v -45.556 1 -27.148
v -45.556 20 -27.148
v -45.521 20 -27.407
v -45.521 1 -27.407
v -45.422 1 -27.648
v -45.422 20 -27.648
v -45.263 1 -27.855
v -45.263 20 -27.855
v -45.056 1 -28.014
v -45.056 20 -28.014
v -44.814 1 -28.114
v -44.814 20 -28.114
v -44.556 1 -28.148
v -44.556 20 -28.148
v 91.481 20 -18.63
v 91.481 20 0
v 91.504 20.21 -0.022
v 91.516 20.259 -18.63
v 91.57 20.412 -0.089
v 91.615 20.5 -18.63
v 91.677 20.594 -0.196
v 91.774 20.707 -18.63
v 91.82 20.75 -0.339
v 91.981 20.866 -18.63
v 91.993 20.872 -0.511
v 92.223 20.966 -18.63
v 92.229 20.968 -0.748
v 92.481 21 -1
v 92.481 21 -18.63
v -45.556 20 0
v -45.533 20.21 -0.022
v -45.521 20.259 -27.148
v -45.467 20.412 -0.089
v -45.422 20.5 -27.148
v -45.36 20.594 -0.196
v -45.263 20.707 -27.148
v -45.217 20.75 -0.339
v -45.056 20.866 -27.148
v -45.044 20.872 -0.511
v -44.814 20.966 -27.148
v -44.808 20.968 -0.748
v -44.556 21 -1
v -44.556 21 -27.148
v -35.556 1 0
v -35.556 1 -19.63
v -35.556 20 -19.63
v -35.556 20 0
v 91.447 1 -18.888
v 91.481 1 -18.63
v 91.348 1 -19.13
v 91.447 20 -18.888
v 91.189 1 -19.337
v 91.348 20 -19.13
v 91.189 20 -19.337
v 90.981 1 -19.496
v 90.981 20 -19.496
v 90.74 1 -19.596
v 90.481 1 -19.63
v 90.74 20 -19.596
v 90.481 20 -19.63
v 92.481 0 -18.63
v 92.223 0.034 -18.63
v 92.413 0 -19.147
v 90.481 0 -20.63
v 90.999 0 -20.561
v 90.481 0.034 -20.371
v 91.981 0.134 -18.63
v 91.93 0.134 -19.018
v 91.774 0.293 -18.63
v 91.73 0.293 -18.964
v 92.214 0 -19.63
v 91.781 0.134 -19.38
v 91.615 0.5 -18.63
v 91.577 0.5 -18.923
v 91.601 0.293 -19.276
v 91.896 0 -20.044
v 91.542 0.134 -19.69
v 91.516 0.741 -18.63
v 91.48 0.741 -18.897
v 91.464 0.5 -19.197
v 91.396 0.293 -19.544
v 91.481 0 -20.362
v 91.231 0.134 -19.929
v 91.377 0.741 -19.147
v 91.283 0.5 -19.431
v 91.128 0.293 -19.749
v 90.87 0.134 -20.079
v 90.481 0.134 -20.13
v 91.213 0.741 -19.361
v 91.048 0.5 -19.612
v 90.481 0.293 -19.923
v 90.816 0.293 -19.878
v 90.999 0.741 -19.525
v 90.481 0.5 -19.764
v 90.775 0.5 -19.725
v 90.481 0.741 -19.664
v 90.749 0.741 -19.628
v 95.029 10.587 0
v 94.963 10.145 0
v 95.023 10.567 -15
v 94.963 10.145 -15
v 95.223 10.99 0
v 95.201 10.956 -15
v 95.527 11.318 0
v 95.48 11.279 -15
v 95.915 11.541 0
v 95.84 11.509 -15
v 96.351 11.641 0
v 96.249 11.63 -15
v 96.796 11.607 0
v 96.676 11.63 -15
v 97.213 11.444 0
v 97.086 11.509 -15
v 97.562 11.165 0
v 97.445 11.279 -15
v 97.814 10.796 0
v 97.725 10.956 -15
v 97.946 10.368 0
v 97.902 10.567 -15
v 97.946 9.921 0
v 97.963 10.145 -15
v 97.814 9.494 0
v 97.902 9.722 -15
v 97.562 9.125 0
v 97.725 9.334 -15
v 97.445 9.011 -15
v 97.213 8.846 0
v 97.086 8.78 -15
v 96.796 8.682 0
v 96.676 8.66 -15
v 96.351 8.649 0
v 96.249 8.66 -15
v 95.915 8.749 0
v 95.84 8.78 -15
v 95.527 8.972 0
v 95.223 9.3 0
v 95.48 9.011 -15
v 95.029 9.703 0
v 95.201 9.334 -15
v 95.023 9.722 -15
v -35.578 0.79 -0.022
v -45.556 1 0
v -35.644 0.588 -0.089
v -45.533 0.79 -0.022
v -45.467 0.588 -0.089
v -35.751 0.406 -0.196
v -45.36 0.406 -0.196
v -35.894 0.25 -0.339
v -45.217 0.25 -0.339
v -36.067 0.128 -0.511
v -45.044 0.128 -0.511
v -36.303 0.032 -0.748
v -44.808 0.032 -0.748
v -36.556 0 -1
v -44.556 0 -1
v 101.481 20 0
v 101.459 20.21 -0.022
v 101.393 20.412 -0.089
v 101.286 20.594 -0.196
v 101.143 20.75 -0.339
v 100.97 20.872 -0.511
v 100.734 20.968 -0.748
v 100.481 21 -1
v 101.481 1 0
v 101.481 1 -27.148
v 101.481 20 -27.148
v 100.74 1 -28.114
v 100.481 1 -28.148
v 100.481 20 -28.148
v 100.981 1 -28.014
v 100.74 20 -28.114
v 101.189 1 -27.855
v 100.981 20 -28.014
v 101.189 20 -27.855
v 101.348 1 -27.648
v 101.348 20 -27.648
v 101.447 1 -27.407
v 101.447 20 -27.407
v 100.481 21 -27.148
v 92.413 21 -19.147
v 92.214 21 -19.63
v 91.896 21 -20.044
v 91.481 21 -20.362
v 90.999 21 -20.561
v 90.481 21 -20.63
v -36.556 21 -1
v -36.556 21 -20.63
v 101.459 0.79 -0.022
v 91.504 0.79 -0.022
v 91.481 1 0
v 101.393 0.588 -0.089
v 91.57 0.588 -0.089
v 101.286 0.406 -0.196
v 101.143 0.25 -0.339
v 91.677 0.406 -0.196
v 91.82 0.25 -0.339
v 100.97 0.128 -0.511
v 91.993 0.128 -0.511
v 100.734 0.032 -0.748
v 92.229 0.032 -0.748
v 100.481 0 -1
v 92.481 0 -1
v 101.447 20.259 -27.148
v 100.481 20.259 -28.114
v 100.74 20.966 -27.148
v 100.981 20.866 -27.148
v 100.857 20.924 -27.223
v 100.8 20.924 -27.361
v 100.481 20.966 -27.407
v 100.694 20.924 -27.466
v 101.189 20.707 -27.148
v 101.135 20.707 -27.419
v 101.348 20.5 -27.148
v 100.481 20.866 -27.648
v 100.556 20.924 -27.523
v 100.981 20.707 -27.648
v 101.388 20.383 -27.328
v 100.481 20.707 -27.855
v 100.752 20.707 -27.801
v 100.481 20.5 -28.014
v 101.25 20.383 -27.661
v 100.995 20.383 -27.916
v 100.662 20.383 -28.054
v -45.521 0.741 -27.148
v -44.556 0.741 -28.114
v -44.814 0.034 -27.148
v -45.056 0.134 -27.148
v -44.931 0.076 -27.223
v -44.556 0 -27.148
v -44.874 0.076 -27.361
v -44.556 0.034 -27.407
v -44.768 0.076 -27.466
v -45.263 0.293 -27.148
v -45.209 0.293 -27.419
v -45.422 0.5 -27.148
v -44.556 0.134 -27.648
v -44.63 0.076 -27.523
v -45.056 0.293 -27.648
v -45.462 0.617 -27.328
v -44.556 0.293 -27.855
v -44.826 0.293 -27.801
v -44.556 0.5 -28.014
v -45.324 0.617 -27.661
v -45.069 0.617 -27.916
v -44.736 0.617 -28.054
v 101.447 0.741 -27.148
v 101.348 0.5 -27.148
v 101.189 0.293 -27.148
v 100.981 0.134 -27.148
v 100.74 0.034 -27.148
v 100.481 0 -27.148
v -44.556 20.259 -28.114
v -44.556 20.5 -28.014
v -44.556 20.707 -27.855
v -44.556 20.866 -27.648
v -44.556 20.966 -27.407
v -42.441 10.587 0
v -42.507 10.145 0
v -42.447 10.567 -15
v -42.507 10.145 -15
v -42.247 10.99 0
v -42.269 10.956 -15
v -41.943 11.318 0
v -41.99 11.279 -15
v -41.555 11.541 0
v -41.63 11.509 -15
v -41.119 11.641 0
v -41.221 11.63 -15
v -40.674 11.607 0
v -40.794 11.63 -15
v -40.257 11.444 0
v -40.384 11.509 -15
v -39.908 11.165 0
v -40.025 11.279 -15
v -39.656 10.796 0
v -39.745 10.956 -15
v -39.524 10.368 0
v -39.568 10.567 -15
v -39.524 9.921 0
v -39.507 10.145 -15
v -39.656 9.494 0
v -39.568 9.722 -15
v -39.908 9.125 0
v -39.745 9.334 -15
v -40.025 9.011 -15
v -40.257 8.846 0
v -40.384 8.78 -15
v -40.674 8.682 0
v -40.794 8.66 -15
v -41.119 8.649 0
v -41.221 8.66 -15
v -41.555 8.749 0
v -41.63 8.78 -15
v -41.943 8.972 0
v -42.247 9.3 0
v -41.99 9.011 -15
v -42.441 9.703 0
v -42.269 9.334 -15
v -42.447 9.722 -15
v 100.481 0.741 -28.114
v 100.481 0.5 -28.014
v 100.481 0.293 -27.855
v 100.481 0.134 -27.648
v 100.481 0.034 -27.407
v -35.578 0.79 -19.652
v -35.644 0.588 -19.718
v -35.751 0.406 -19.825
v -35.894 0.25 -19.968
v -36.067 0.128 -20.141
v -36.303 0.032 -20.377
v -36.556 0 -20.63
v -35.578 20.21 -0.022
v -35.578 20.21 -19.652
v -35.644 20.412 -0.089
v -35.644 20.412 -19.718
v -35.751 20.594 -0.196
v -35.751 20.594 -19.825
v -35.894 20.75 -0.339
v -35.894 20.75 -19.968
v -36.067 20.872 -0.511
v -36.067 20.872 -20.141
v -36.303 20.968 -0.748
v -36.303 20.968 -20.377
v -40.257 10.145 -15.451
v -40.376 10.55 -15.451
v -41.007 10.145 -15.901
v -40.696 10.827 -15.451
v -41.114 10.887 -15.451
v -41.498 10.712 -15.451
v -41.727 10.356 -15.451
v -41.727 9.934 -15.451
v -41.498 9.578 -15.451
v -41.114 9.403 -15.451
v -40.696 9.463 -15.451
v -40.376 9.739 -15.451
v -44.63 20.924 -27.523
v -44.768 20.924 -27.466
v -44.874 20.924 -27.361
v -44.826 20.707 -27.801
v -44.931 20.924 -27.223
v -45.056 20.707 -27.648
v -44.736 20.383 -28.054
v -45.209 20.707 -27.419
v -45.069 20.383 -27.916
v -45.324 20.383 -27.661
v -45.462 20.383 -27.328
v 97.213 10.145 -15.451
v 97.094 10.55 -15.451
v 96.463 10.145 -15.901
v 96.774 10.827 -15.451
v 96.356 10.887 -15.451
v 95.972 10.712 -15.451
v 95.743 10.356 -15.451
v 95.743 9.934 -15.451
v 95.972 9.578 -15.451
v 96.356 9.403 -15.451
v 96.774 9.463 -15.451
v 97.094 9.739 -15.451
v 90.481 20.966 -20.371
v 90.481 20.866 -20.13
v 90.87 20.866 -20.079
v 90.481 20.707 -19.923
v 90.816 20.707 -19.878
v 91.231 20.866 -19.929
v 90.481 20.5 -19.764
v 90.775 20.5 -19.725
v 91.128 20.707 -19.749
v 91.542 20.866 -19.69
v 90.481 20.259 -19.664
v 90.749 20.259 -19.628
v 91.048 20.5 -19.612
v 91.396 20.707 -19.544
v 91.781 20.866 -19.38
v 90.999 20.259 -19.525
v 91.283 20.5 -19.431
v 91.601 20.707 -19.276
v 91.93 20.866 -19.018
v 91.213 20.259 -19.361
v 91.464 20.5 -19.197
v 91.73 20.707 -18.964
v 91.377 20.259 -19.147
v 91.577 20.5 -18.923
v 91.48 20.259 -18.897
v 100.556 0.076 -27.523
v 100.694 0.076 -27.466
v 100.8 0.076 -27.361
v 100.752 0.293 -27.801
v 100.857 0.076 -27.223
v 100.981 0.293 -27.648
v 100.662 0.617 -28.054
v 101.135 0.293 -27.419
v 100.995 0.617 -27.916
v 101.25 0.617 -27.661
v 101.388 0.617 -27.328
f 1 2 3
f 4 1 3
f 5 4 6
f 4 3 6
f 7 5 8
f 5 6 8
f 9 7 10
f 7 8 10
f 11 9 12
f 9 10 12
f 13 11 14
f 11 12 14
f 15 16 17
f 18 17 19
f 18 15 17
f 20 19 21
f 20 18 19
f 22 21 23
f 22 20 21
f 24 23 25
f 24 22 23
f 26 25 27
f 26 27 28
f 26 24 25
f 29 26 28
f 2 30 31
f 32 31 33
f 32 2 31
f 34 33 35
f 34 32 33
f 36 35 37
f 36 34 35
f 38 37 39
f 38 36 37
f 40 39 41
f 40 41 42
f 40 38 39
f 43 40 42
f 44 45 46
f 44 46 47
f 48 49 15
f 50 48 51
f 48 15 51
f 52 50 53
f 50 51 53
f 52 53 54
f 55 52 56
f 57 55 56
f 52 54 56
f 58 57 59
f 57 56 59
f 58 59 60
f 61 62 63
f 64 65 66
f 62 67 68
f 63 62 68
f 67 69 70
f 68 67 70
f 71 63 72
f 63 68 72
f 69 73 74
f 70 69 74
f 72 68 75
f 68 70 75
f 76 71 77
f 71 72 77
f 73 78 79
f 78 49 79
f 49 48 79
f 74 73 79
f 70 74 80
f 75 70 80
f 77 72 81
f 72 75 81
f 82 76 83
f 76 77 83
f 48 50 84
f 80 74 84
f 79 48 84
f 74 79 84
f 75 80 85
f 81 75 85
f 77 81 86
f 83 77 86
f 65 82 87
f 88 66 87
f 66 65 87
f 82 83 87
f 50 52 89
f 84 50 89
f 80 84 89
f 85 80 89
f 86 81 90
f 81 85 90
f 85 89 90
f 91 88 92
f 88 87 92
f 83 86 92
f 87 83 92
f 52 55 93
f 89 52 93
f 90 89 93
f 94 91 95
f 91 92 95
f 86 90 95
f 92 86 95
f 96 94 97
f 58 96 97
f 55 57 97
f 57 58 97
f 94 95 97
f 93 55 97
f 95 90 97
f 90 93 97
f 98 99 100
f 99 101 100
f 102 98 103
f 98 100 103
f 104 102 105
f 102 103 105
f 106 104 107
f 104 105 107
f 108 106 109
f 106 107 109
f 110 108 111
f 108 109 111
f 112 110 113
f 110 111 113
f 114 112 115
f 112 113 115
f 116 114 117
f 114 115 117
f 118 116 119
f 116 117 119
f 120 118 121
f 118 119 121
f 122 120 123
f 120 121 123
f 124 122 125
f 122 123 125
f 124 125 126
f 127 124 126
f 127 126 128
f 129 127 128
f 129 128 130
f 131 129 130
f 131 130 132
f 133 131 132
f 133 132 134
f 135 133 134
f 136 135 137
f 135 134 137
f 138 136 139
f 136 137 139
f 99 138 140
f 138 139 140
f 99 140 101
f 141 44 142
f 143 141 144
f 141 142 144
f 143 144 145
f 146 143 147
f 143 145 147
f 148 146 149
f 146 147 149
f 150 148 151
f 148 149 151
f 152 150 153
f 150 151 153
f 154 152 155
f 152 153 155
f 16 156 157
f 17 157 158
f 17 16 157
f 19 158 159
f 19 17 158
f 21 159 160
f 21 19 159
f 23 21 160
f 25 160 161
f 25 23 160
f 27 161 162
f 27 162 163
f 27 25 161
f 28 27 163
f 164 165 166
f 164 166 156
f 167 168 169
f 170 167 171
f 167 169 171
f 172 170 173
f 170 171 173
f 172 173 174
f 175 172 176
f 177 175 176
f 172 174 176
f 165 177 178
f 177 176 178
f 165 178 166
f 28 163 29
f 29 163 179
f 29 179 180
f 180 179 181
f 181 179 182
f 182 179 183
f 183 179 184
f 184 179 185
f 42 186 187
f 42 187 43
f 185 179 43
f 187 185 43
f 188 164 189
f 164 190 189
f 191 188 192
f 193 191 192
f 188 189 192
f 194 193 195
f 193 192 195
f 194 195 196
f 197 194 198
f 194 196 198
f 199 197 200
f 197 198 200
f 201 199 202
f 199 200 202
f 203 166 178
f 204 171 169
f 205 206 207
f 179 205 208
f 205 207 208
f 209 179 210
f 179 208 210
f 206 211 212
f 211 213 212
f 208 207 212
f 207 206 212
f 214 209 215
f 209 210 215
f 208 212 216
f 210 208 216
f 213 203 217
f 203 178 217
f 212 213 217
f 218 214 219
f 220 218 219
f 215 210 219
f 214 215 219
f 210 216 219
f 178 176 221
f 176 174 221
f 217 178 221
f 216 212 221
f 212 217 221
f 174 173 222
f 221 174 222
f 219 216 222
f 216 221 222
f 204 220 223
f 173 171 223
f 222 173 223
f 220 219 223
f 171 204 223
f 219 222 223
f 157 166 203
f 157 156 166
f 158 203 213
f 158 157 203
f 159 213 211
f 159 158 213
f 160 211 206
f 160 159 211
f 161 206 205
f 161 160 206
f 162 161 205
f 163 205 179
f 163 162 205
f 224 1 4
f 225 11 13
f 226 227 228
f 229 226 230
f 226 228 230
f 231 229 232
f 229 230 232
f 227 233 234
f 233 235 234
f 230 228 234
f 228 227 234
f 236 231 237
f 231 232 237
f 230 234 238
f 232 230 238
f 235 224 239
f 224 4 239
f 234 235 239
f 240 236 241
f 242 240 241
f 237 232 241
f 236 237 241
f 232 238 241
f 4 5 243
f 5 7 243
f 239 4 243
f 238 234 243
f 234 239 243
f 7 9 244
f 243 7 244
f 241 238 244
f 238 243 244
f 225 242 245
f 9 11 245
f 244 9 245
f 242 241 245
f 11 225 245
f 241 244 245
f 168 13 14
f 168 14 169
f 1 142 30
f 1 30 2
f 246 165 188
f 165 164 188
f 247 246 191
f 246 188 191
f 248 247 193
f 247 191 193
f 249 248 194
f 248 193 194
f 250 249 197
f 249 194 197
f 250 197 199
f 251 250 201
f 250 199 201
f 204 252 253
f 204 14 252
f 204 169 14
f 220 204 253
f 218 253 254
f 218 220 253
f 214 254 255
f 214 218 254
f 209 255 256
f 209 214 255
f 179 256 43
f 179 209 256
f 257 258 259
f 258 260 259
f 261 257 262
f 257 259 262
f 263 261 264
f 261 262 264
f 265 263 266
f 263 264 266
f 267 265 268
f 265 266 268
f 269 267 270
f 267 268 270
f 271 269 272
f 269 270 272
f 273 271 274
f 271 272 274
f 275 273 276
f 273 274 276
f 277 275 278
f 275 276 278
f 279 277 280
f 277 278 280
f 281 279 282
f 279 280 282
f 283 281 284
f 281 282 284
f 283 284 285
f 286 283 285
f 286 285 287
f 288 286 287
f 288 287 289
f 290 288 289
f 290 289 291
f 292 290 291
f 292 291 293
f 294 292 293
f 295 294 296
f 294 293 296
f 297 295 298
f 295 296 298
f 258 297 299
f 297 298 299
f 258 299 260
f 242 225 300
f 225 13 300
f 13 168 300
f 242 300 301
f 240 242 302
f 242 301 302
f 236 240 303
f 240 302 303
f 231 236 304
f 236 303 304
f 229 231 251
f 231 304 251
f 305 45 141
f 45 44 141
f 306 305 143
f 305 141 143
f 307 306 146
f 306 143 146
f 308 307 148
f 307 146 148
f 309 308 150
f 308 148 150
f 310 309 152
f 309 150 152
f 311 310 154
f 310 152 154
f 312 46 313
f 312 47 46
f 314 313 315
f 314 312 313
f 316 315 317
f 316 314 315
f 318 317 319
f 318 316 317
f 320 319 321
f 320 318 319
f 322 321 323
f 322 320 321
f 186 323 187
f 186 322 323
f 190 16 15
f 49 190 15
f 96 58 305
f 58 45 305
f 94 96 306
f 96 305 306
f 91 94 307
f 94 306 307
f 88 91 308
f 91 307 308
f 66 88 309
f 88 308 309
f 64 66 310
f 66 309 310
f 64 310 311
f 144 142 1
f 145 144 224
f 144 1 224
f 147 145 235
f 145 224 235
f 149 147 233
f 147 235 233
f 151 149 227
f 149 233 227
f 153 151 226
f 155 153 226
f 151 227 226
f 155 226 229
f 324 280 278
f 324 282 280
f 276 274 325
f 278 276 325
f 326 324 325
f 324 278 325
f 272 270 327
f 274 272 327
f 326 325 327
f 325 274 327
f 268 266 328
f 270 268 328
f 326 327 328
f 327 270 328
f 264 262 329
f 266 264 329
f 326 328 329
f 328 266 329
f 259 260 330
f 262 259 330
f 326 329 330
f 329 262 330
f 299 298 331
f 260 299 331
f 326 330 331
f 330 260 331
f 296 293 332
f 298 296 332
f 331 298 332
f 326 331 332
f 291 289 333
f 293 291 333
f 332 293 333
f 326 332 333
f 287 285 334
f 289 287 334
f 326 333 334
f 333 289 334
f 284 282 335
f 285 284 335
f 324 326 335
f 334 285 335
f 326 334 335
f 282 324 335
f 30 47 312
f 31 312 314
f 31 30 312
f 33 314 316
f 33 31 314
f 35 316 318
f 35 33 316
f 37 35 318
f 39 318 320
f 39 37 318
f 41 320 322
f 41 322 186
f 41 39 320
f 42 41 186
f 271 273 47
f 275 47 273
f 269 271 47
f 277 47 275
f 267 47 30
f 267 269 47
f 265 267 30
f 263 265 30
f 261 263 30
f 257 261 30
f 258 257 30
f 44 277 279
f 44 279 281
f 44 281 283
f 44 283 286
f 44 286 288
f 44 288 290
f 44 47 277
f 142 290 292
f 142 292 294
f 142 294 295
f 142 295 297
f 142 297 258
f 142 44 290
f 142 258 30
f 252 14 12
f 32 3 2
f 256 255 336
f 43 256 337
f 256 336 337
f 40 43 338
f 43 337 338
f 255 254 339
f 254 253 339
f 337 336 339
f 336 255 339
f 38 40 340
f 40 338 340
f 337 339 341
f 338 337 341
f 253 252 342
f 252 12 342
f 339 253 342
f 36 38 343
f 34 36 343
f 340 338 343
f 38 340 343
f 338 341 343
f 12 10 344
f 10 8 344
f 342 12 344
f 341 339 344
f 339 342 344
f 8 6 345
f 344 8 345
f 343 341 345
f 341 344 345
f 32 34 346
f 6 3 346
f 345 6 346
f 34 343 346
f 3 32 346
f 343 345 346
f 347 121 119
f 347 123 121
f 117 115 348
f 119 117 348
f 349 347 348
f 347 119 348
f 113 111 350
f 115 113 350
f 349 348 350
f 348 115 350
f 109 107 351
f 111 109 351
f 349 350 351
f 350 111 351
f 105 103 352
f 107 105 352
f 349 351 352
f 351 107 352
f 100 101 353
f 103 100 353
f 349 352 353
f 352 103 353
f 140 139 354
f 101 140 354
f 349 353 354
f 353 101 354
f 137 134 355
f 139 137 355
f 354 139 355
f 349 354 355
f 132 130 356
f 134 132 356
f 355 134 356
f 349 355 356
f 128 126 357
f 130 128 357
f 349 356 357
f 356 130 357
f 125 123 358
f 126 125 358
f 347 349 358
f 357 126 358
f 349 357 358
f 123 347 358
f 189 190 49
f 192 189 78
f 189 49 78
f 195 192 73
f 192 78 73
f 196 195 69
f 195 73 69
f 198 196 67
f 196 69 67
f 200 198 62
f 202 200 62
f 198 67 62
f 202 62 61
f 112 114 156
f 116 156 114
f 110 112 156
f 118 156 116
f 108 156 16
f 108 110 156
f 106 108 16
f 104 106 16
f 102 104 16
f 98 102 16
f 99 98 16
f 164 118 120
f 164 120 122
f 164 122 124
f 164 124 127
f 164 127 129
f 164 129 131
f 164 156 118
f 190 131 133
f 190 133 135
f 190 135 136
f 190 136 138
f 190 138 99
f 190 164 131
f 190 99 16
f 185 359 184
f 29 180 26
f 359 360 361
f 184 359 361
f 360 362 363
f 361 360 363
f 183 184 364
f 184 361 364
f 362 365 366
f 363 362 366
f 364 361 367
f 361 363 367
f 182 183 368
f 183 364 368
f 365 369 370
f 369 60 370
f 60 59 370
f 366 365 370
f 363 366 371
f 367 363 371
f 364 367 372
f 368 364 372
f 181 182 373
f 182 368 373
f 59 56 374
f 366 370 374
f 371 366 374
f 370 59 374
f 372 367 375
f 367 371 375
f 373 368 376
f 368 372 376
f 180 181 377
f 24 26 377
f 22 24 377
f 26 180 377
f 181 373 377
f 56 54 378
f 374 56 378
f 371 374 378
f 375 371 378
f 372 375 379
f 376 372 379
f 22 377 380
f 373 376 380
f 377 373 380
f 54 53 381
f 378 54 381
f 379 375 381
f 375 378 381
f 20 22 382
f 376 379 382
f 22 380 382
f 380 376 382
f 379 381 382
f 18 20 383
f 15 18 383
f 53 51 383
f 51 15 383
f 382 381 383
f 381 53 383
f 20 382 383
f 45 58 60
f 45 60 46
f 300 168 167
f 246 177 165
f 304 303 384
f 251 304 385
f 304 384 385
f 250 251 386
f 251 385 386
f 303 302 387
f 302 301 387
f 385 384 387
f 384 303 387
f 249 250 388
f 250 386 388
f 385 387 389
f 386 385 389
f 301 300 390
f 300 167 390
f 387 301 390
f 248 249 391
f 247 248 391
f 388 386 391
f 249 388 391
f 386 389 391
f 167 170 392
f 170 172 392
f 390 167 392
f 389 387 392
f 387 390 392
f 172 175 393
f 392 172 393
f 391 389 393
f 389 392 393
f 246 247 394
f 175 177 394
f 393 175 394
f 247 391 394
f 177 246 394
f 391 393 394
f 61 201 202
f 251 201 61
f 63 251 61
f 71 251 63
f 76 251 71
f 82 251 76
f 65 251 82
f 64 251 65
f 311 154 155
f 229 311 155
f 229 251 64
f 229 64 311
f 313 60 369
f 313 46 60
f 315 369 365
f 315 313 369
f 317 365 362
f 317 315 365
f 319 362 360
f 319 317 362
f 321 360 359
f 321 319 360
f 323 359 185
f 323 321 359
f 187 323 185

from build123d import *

# Parameters (mm, degrees)
SALIENTE_EXTRUIR1_DEPTH           = 21
REDONDEO1_R                       = 1
RANURAS_DE_ESPIGA_DE_3_0MM1_D     = 3
RANURAS_DE_ESPIGA_DE_3_0MM1_DEPTH = 15
RANURAS_DE_ESPIGA_DE_3_0MM1_TIP   = 0.901290929


with BuildPart() as part:
    # Croquis1 → Saliente-Extruir1 (new body)
    with BuildSketch(Plane(origin=(0, 0, 0), x_dir=(1, 0, 0), z_dir=(0, 1, 0))):
        Polygon((-45.555555556, 0), (-45.555555556, 28.148148148), (101.481481481, 28.148148148), (101.481481481, 0), (91.481481481, 0), (91.481481481, 19.62962963), (-35.555555556, 19.62962963), (-35.555555556, 0), align=None)
    extrude(amount=SALIENTE_EXTRUIR1_DEPTH)

    # Redondeo1
    redondeo1_edges = [part.edges().sort_by_distance(p)[0] for p in [
        (27.962962963, 21, -19.62962963),
        (-35.555555556, 0, -9.814814815),
        (-40.555555556, 0, 0),
        (91.481481481, 21, -9.814814815),
        (-45.555555556, 10.5, -28.148148148),
        (101.481481481, 10.5, -28.148148148),
        (91.481481481, 10.5, -19.62962963),
        (96.481481481, 21, 0),
        (101.481481481, 21, -14.074074074),
        (27.962962963, 21, -28.148148148),
        (-45.555555556, 21, -14.074074074),
        (-40.555555556, 21, 0),
        (-35.555555556, 21, -9.814814815),
        (-45.555555556, 0, -14.074074074),
        (27.962962963, 0, -28.148148148),
        (101.481481481, 0, -14.074074074),
        (96.481481481, 0, 0),
        (91.481481481, 0, -9.814814815),
        (27.962962963, 0, -19.62962963),
    ]]
    fillet(redondeo1_edges, radius=REDONDEO1_R)

    # Ranuras de espiga de Ø3.0mm1
    with Locations(Plane.XY):
        with Locations((-41.007352785, 10.144878608), (96.462672376, 10.144878608)):
            Hole(RANURAS_DE_ESPIGA_DE_3_0MM1_D / 2, depth=RANURAS_DE_ESPIGA_DE_3_0MM1_DEPTH)
            with Locations((0, 0, -(RANURAS_DE_ESPIGA_DE_3_0MM1_DEPTH + RANURAS_DE_ESPIGA_DE_3_0MM1_TIP / 2))):  # 118° drill point
                Cone(0, RANURAS_DE_ESPIGA_DE_3_0MM1_D / 2, RANURAS_DE_ESPIGA_DE_3_0MM1_TIP, mode=Mode.SUBTRACT)


solid = part.part
